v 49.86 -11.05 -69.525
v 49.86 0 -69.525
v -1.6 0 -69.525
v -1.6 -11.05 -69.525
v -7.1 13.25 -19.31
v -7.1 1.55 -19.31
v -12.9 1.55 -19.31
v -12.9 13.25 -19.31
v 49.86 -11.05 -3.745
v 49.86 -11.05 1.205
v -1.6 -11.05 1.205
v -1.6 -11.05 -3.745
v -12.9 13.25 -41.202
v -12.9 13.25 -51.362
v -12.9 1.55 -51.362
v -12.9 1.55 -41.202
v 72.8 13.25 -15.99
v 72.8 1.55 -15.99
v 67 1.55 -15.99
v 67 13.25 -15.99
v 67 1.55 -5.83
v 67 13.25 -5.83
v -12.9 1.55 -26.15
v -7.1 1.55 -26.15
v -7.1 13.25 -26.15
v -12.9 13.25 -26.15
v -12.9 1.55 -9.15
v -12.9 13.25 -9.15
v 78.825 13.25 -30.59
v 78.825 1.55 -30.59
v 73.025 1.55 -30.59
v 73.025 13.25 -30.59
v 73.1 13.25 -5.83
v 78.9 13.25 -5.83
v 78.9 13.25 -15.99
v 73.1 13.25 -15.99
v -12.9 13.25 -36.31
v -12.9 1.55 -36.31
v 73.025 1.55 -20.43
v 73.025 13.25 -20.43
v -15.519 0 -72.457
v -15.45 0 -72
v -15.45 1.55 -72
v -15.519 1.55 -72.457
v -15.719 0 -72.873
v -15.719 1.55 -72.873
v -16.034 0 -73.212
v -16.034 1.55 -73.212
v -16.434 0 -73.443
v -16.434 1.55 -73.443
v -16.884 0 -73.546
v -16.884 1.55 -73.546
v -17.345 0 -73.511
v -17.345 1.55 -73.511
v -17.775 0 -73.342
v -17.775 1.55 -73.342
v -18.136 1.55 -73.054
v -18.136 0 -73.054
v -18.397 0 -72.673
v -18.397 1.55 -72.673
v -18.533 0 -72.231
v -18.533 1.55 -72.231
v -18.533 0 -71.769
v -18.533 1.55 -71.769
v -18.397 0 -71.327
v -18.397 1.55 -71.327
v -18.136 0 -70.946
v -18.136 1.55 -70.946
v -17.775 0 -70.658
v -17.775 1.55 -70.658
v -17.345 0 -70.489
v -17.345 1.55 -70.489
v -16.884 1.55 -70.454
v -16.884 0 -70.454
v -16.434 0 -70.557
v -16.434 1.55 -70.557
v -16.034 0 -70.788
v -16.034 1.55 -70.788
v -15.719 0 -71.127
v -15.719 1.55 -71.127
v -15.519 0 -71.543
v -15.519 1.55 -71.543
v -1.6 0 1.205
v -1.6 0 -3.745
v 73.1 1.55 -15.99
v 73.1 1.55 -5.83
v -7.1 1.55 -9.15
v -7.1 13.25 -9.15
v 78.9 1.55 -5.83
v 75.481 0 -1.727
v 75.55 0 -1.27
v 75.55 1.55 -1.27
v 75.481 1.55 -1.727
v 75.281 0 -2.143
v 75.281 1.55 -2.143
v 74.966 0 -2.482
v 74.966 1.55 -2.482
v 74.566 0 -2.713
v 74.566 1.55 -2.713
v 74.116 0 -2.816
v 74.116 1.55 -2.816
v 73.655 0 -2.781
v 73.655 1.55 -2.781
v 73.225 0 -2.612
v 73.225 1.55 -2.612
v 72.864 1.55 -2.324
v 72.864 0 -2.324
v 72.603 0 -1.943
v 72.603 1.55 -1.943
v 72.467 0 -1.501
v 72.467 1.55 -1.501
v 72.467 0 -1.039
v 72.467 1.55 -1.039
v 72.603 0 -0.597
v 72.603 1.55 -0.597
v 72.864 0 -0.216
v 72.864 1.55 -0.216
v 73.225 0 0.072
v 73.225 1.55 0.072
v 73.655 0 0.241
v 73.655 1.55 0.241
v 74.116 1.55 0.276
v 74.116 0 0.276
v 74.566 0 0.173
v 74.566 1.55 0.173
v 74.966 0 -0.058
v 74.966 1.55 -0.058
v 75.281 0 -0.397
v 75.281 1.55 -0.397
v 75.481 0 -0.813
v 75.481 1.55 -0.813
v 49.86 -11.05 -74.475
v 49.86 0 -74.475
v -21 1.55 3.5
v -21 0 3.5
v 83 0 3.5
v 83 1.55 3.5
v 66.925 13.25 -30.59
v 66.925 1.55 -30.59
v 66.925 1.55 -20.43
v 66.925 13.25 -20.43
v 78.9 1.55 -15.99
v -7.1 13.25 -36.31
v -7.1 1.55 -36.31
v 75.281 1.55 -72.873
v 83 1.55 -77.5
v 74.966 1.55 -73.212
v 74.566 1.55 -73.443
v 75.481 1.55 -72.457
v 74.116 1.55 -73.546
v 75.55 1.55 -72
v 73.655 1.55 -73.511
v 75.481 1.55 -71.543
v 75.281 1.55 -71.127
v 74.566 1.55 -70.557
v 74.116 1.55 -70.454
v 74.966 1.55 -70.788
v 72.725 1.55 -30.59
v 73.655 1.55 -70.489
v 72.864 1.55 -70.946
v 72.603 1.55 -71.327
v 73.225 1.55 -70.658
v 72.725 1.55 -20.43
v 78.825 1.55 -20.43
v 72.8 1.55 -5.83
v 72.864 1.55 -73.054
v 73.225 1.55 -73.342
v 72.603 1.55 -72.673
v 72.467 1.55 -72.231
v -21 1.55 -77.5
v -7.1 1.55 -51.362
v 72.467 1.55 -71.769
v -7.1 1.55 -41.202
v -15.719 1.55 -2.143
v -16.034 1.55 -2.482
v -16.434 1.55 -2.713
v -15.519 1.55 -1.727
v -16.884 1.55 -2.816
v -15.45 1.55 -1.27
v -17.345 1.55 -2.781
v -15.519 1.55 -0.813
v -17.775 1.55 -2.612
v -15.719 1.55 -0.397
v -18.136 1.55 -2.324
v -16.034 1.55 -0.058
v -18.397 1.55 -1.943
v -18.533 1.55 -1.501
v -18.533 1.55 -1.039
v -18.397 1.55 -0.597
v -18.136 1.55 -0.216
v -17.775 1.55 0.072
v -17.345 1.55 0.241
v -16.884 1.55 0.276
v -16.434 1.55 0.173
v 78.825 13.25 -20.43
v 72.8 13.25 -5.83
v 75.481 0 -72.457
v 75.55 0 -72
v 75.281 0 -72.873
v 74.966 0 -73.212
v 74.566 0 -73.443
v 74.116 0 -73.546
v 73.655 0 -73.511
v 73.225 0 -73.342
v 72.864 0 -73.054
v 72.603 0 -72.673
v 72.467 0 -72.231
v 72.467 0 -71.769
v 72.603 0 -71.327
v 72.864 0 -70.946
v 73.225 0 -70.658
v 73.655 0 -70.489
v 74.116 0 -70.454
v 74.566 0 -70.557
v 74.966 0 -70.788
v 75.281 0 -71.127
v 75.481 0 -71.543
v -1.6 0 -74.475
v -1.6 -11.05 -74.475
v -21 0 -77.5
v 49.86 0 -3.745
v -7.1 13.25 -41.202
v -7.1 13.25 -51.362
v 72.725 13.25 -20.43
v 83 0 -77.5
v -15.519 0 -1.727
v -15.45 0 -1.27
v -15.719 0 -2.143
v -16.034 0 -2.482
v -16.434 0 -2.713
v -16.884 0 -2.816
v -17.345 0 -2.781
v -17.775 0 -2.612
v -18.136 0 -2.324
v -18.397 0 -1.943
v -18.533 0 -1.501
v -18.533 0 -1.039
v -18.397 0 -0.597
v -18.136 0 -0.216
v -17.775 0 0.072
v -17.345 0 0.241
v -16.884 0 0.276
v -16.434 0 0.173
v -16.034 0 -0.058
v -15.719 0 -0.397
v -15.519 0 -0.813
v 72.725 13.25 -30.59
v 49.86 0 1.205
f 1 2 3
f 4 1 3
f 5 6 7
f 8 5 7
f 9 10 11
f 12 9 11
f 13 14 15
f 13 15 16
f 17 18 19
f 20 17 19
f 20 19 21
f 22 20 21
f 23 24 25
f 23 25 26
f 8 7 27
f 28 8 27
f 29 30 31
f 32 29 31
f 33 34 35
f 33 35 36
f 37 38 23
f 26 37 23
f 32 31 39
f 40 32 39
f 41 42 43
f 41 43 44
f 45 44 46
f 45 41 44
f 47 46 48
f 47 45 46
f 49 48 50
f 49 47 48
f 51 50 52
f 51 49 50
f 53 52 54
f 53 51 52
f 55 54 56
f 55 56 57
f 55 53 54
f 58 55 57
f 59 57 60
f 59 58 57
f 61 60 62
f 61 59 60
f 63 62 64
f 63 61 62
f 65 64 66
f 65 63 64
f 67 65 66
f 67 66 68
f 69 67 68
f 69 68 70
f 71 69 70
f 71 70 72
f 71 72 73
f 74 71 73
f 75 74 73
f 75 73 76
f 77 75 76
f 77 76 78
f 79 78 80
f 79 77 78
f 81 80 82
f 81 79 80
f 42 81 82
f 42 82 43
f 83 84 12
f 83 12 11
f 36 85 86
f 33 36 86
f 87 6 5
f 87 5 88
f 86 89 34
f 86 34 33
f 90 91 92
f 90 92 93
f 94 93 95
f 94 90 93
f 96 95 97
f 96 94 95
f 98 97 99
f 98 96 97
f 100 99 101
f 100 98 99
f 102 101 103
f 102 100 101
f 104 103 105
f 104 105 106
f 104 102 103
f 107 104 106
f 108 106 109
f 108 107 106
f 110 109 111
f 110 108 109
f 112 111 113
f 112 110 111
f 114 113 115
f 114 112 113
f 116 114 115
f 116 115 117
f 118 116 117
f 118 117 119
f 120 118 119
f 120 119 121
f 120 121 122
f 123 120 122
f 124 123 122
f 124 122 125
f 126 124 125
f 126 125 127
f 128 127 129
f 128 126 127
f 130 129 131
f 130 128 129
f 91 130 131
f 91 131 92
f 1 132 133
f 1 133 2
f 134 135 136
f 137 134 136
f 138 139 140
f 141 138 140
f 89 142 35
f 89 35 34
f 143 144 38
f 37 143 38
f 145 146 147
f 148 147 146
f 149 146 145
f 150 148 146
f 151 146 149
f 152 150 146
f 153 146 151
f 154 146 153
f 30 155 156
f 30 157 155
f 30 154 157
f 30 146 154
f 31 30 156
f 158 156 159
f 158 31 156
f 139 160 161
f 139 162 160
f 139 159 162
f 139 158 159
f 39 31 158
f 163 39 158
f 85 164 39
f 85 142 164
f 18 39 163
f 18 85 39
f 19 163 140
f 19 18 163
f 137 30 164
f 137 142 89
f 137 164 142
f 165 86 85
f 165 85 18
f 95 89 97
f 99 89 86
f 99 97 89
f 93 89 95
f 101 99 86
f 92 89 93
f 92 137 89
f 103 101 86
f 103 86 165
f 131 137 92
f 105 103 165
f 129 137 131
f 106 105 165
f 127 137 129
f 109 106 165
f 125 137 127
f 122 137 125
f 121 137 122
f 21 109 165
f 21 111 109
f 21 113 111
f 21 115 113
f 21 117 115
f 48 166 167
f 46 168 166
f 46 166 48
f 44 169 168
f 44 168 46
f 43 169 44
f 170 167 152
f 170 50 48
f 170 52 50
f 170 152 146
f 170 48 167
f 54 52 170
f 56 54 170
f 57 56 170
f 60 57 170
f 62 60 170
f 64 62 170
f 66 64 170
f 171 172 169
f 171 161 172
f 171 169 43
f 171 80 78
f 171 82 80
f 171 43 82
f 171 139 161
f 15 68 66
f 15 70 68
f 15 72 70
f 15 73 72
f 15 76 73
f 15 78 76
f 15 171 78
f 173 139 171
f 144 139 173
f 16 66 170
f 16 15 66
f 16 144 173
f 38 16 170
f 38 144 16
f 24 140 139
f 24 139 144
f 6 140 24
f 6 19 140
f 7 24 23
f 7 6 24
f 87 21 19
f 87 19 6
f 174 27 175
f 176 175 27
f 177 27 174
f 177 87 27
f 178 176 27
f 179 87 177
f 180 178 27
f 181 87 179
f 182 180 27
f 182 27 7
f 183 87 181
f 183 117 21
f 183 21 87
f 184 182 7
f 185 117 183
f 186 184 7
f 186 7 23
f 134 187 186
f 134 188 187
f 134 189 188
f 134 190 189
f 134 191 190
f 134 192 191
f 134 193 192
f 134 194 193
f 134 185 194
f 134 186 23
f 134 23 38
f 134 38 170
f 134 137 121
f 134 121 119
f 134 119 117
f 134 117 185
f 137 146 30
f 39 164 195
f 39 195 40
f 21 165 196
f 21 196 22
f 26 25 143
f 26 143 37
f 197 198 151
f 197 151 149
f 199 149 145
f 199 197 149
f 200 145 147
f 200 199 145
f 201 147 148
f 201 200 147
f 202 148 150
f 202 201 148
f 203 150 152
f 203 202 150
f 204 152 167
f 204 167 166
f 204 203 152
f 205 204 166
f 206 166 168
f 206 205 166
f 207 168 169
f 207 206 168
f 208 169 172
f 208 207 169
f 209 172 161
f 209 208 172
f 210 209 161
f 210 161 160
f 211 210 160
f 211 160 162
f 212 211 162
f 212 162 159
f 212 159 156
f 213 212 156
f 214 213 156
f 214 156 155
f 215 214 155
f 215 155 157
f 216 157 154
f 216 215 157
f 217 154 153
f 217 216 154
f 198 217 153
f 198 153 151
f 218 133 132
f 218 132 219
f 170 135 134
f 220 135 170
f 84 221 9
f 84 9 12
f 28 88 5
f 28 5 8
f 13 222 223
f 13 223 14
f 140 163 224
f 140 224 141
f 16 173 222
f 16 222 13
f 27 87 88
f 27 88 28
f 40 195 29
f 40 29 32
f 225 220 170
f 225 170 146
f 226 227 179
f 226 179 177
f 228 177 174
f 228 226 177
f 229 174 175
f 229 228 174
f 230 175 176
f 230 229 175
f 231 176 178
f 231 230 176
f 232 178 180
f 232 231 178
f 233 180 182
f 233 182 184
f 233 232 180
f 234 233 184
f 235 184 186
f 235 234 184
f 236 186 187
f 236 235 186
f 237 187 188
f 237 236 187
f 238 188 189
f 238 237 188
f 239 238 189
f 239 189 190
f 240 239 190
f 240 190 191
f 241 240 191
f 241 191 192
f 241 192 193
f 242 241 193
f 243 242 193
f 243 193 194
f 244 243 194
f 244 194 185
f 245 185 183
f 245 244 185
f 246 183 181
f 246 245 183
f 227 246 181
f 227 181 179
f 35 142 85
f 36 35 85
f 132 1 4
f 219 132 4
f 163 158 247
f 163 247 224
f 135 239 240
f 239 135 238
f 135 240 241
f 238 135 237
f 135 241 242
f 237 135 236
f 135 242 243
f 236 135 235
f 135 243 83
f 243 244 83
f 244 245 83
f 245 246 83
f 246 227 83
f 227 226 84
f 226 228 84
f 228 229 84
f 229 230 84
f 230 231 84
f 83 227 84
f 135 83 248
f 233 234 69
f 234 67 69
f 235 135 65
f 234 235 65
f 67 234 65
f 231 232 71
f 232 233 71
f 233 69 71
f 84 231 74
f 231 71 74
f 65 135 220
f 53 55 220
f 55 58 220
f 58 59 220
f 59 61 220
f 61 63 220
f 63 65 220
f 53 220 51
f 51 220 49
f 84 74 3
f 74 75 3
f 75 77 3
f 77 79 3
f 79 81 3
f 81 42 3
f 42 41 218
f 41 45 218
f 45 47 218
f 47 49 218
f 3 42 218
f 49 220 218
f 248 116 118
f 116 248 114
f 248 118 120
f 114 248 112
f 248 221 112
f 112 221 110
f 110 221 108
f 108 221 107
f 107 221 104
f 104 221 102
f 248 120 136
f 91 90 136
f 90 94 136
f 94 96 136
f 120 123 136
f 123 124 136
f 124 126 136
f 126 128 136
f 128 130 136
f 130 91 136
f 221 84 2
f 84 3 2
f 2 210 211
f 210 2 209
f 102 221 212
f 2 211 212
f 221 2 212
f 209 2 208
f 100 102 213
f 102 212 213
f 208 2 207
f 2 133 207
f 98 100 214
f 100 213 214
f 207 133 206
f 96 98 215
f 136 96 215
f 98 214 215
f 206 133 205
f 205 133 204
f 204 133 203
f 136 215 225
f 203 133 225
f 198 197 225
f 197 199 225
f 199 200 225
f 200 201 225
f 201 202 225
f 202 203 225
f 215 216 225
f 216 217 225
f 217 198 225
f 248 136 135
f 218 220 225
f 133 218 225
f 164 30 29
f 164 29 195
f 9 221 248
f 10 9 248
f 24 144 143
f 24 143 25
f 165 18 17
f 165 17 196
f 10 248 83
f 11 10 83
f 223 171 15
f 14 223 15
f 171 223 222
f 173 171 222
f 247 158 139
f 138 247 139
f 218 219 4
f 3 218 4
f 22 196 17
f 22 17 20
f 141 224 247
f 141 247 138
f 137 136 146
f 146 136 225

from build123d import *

# Parameters (mm, degrees)
ESQUISSE1_W      = 104
ESQUISSE1_H      = 81
ESQUISSE1_R      = 1.55
EXTRUSION2_DEPTH = 1.55
ESQUISSE2_W      = 51.46
ESQUISSE2_H      = 4.95
EXTRUSION3_DEPTH = 12.6
ESQUISSE3_W      = 5.8
ESQUISSE3_H      = 10.16
EXTRUSION4_DEPTH = 11.7
ESQUISSE4_W      = 5.8
ESQUISSE4_H      = 10.16
EXTRUSION5_DEPTH = 11.7


with BuildPart() as part:
    # Esquisse1 → Extrusion2 (new body)
    with BuildSketch(Plane(origin=(0, 0, 0), x_dir=(1, 0, 0), z_dir=(0, 1, 0))):
        with Locations((31, 37)):
            Rectangle(ESQUISSE1_W, ESQUISSE1_H)
        with Locations((-17, 1.27)):
            Circle(ESQUISSE1_R, mode=Mode.SUBTRACT)
        with Locations((-17, 72)):
            Circle(ESQUISSE1_R, mode=Mode.SUBTRACT)
        with Locations((74, 72)):
            Circle(ESQUISSE1_R, mode=Mode.SUBTRACT)
        with Locations((74, 1.27)):
            Circle(ESQUISSE1_R, mode=Mode.SUBTRACT)
    extrude(amount=EXTRUSION2_DEPTH)

    # Esquisse2 → Extrusion3 (add)
    with BuildSketch(Plane(origin=(0, 1.55, 0), x_dir=(-1, 0, 0), z_dir=(0, 1, 0))):
        with Locations((-24.13, -72)):
            Rectangle(ESQUISSE2_W, ESQUISSE2_H)
        with Locations((-24.13, -1.27)):
            Rectangle(ESQUISSE2_W, ESQUISSE2_H)
    extrude(amount=-EXTRUSION3_DEPTH)

    # Esquisse3 → Extrusion4 (add)
    with BuildSketch(Plane(origin=(0, 1.55, 0), x_dir=(-1, 0, 0), z_dir=(0, 1, 0))):
        with Locations((10, -31.23)):
            Rectangle(ESQUISSE3_W, ESQUISSE3_H)
        with Locations((10, -14.23)):
            Rectangle(ESQUISSE3_W, ESQUISSE3_H)
        with Locations((10, -46.282)):
            Rectangle(ESQUISSE3_W, ESQUISSE3_H)
    extrude(amount=EXTRUSION4_DEPTH)

    # Esquisse4 → Extrusion5 (add)
    with BuildSketch(Plane(origin=(0, 1.55, 0), x_dir=(-1, 0, 0), z_dir=(0, 1, 0))):
        with Locations((-69.9, -10.91)):
            Rectangle(ESQUISSE4_W, ESQUISSE4_H)
        with Locations((-76, -10.91)):
            Rectangle(ESQUISSE4_W, ESQUISSE4_H)
        with Locations((-69.825093766, -25.51)):
            Rectangle(ESQUISSE4_W, ESQUISSE4_H)
        with Locations((-75.925093766, -25.51)):
            Rectangle(ESQUISSE4_W, ESQUISSE4_H)
    extrude(amount=EXTRUSION5_DEPTH)


solid = part.part
